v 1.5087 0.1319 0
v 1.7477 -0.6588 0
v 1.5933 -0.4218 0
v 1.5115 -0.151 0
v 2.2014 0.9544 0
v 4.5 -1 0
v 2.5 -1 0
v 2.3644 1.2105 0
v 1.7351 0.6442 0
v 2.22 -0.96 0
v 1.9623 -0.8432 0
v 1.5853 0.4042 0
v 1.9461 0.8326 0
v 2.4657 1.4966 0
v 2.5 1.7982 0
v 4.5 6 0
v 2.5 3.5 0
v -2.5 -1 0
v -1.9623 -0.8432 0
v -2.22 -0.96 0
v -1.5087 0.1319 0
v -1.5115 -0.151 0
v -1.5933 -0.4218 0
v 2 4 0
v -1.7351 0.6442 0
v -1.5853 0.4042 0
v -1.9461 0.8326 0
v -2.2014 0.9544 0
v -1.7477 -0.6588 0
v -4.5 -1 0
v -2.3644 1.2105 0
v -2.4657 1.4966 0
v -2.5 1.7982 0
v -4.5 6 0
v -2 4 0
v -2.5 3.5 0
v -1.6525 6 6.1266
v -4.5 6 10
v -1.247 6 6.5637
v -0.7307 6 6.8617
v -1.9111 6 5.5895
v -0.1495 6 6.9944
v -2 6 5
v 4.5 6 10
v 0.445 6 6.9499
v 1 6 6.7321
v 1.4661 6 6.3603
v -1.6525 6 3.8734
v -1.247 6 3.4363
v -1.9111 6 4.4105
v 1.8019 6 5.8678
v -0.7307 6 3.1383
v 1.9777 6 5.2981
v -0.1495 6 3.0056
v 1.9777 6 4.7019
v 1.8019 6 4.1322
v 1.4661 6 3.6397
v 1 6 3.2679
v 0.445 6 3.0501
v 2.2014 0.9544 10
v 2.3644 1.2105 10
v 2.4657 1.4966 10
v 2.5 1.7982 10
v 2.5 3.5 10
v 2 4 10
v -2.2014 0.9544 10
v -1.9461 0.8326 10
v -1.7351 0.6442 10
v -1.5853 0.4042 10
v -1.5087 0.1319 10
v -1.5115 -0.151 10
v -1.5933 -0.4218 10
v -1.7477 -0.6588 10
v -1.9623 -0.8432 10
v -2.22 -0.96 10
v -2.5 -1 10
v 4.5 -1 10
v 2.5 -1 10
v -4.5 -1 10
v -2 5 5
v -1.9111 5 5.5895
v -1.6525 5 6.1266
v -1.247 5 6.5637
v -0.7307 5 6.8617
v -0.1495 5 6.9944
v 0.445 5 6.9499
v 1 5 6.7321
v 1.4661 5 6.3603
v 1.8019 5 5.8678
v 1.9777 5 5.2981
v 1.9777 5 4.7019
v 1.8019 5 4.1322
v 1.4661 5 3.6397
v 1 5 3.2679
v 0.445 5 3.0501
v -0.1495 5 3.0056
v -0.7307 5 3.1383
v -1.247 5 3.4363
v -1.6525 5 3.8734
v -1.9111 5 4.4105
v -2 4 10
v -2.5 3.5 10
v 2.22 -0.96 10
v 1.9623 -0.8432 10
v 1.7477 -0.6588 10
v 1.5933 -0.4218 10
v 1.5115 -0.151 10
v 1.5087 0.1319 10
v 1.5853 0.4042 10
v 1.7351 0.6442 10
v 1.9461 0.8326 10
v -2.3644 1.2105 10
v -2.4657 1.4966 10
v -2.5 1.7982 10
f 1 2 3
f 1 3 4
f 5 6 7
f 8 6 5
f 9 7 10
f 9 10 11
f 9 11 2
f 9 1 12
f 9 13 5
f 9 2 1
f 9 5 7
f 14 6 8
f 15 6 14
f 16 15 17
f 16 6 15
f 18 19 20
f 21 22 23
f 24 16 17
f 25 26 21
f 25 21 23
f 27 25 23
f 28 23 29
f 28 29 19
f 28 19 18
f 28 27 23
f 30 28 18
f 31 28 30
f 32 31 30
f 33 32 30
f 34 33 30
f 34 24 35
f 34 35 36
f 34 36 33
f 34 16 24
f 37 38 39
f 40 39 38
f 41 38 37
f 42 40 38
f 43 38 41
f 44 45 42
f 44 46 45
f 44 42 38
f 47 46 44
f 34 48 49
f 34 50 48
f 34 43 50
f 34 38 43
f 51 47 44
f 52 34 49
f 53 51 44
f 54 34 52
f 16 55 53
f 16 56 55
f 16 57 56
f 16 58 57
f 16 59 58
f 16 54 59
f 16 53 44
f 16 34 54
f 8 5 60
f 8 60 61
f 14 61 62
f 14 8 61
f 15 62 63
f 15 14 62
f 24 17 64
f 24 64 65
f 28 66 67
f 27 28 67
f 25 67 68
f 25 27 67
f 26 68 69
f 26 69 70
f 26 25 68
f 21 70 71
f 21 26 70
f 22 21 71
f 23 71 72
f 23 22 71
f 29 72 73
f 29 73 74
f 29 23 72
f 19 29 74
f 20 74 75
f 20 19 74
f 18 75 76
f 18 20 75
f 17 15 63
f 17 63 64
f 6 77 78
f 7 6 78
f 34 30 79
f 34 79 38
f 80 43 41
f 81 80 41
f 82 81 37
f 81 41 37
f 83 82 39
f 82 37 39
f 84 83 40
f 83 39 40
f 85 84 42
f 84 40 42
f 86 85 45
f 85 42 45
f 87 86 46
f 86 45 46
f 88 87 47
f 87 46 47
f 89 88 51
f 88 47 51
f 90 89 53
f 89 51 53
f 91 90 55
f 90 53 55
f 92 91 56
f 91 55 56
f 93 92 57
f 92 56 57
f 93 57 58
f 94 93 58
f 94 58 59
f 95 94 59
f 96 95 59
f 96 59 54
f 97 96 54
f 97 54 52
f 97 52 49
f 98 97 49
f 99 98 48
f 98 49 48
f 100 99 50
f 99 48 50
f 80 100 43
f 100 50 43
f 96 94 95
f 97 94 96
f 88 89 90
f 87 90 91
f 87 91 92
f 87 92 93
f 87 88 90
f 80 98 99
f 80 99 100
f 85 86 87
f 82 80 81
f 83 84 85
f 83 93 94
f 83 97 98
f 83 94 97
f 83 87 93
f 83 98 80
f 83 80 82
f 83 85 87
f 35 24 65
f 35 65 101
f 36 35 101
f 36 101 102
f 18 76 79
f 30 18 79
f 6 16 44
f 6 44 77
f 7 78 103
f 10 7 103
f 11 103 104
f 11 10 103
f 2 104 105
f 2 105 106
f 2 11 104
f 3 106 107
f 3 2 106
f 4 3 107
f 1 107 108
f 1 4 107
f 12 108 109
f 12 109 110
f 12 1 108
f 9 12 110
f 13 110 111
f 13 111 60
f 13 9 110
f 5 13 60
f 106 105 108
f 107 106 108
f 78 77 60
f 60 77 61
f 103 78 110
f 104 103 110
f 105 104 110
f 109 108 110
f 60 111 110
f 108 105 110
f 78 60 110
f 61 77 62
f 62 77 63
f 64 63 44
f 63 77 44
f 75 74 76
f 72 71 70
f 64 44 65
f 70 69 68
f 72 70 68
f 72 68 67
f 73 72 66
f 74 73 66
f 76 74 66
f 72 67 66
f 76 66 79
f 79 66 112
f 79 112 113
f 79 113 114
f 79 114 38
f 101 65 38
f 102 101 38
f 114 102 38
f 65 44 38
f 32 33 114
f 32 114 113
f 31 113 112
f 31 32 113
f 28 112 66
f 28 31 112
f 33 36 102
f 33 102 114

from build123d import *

# Parameters (mm, degrees)
BOSS_EXTRUDE1_DEPTH = 10
SKETCH2_R           = 2
CUT_EXTRUDE1_DEPTH  = 1


with BuildPart() as part:
    # Sketch1 → Boss-Extrude1 (new body)
    with BuildSketch(Plane.XY):
        with BuildLine():
            Line((2.5, 1.798202453), (2.5, 3.5))
            Line((2.5, 3.5), (2, 4))
            Line((2, 4), (-2, 4))
            Line((-2, 4), (-2.5, 3.5))
            Line((-2.5, 3.5), (-2.5, 1.798202453))
            ThreePointArc((-2.5, 1.798202453), (-2.423157727, 1.350663613), (-2.2014329, 0.954388646))
            ThreePointArc((-2.2014329, 0.954388646), (-1.511468603, -0.151015487), (-2.5, -1))
            Line((-2.5, -1), (-4.5, -1))
            Line((-4.5, -1), (-4.5, 6))
            Line((-4.5, 6), (4.5, 6))
            Line((4.5, 6), (4.5, -1))
            Line((4.5, -1), (2.5, -1))
            ThreePointArc((2.5, -1), (1.511468603, -0.151015487), (2.2014329, 0.954388646))
            ThreePointArc((2.2014329, 0.954388646), (2.423157727, 1.350663613), (2.5, 1.798202453))
        make_face()
    extrude(amount=BOSS_EXTRUDE1_DEPTH)

    # Sketch2 → Cut-Extrude1 (cut)
    with BuildSketch(Plane(origin=(0, 6, 0), x_dir=(1, 0, 0), z_dir=(0, 1, 0))):
        with Locations(Location((0, -5, 0), (0, 0, 180))):
            Circle(SKETCH2_R)
    extrude(amount=-CUT_EXTRUDE1_DEPTH, mode=Mode.SUBTRACT)


solid = part.part
